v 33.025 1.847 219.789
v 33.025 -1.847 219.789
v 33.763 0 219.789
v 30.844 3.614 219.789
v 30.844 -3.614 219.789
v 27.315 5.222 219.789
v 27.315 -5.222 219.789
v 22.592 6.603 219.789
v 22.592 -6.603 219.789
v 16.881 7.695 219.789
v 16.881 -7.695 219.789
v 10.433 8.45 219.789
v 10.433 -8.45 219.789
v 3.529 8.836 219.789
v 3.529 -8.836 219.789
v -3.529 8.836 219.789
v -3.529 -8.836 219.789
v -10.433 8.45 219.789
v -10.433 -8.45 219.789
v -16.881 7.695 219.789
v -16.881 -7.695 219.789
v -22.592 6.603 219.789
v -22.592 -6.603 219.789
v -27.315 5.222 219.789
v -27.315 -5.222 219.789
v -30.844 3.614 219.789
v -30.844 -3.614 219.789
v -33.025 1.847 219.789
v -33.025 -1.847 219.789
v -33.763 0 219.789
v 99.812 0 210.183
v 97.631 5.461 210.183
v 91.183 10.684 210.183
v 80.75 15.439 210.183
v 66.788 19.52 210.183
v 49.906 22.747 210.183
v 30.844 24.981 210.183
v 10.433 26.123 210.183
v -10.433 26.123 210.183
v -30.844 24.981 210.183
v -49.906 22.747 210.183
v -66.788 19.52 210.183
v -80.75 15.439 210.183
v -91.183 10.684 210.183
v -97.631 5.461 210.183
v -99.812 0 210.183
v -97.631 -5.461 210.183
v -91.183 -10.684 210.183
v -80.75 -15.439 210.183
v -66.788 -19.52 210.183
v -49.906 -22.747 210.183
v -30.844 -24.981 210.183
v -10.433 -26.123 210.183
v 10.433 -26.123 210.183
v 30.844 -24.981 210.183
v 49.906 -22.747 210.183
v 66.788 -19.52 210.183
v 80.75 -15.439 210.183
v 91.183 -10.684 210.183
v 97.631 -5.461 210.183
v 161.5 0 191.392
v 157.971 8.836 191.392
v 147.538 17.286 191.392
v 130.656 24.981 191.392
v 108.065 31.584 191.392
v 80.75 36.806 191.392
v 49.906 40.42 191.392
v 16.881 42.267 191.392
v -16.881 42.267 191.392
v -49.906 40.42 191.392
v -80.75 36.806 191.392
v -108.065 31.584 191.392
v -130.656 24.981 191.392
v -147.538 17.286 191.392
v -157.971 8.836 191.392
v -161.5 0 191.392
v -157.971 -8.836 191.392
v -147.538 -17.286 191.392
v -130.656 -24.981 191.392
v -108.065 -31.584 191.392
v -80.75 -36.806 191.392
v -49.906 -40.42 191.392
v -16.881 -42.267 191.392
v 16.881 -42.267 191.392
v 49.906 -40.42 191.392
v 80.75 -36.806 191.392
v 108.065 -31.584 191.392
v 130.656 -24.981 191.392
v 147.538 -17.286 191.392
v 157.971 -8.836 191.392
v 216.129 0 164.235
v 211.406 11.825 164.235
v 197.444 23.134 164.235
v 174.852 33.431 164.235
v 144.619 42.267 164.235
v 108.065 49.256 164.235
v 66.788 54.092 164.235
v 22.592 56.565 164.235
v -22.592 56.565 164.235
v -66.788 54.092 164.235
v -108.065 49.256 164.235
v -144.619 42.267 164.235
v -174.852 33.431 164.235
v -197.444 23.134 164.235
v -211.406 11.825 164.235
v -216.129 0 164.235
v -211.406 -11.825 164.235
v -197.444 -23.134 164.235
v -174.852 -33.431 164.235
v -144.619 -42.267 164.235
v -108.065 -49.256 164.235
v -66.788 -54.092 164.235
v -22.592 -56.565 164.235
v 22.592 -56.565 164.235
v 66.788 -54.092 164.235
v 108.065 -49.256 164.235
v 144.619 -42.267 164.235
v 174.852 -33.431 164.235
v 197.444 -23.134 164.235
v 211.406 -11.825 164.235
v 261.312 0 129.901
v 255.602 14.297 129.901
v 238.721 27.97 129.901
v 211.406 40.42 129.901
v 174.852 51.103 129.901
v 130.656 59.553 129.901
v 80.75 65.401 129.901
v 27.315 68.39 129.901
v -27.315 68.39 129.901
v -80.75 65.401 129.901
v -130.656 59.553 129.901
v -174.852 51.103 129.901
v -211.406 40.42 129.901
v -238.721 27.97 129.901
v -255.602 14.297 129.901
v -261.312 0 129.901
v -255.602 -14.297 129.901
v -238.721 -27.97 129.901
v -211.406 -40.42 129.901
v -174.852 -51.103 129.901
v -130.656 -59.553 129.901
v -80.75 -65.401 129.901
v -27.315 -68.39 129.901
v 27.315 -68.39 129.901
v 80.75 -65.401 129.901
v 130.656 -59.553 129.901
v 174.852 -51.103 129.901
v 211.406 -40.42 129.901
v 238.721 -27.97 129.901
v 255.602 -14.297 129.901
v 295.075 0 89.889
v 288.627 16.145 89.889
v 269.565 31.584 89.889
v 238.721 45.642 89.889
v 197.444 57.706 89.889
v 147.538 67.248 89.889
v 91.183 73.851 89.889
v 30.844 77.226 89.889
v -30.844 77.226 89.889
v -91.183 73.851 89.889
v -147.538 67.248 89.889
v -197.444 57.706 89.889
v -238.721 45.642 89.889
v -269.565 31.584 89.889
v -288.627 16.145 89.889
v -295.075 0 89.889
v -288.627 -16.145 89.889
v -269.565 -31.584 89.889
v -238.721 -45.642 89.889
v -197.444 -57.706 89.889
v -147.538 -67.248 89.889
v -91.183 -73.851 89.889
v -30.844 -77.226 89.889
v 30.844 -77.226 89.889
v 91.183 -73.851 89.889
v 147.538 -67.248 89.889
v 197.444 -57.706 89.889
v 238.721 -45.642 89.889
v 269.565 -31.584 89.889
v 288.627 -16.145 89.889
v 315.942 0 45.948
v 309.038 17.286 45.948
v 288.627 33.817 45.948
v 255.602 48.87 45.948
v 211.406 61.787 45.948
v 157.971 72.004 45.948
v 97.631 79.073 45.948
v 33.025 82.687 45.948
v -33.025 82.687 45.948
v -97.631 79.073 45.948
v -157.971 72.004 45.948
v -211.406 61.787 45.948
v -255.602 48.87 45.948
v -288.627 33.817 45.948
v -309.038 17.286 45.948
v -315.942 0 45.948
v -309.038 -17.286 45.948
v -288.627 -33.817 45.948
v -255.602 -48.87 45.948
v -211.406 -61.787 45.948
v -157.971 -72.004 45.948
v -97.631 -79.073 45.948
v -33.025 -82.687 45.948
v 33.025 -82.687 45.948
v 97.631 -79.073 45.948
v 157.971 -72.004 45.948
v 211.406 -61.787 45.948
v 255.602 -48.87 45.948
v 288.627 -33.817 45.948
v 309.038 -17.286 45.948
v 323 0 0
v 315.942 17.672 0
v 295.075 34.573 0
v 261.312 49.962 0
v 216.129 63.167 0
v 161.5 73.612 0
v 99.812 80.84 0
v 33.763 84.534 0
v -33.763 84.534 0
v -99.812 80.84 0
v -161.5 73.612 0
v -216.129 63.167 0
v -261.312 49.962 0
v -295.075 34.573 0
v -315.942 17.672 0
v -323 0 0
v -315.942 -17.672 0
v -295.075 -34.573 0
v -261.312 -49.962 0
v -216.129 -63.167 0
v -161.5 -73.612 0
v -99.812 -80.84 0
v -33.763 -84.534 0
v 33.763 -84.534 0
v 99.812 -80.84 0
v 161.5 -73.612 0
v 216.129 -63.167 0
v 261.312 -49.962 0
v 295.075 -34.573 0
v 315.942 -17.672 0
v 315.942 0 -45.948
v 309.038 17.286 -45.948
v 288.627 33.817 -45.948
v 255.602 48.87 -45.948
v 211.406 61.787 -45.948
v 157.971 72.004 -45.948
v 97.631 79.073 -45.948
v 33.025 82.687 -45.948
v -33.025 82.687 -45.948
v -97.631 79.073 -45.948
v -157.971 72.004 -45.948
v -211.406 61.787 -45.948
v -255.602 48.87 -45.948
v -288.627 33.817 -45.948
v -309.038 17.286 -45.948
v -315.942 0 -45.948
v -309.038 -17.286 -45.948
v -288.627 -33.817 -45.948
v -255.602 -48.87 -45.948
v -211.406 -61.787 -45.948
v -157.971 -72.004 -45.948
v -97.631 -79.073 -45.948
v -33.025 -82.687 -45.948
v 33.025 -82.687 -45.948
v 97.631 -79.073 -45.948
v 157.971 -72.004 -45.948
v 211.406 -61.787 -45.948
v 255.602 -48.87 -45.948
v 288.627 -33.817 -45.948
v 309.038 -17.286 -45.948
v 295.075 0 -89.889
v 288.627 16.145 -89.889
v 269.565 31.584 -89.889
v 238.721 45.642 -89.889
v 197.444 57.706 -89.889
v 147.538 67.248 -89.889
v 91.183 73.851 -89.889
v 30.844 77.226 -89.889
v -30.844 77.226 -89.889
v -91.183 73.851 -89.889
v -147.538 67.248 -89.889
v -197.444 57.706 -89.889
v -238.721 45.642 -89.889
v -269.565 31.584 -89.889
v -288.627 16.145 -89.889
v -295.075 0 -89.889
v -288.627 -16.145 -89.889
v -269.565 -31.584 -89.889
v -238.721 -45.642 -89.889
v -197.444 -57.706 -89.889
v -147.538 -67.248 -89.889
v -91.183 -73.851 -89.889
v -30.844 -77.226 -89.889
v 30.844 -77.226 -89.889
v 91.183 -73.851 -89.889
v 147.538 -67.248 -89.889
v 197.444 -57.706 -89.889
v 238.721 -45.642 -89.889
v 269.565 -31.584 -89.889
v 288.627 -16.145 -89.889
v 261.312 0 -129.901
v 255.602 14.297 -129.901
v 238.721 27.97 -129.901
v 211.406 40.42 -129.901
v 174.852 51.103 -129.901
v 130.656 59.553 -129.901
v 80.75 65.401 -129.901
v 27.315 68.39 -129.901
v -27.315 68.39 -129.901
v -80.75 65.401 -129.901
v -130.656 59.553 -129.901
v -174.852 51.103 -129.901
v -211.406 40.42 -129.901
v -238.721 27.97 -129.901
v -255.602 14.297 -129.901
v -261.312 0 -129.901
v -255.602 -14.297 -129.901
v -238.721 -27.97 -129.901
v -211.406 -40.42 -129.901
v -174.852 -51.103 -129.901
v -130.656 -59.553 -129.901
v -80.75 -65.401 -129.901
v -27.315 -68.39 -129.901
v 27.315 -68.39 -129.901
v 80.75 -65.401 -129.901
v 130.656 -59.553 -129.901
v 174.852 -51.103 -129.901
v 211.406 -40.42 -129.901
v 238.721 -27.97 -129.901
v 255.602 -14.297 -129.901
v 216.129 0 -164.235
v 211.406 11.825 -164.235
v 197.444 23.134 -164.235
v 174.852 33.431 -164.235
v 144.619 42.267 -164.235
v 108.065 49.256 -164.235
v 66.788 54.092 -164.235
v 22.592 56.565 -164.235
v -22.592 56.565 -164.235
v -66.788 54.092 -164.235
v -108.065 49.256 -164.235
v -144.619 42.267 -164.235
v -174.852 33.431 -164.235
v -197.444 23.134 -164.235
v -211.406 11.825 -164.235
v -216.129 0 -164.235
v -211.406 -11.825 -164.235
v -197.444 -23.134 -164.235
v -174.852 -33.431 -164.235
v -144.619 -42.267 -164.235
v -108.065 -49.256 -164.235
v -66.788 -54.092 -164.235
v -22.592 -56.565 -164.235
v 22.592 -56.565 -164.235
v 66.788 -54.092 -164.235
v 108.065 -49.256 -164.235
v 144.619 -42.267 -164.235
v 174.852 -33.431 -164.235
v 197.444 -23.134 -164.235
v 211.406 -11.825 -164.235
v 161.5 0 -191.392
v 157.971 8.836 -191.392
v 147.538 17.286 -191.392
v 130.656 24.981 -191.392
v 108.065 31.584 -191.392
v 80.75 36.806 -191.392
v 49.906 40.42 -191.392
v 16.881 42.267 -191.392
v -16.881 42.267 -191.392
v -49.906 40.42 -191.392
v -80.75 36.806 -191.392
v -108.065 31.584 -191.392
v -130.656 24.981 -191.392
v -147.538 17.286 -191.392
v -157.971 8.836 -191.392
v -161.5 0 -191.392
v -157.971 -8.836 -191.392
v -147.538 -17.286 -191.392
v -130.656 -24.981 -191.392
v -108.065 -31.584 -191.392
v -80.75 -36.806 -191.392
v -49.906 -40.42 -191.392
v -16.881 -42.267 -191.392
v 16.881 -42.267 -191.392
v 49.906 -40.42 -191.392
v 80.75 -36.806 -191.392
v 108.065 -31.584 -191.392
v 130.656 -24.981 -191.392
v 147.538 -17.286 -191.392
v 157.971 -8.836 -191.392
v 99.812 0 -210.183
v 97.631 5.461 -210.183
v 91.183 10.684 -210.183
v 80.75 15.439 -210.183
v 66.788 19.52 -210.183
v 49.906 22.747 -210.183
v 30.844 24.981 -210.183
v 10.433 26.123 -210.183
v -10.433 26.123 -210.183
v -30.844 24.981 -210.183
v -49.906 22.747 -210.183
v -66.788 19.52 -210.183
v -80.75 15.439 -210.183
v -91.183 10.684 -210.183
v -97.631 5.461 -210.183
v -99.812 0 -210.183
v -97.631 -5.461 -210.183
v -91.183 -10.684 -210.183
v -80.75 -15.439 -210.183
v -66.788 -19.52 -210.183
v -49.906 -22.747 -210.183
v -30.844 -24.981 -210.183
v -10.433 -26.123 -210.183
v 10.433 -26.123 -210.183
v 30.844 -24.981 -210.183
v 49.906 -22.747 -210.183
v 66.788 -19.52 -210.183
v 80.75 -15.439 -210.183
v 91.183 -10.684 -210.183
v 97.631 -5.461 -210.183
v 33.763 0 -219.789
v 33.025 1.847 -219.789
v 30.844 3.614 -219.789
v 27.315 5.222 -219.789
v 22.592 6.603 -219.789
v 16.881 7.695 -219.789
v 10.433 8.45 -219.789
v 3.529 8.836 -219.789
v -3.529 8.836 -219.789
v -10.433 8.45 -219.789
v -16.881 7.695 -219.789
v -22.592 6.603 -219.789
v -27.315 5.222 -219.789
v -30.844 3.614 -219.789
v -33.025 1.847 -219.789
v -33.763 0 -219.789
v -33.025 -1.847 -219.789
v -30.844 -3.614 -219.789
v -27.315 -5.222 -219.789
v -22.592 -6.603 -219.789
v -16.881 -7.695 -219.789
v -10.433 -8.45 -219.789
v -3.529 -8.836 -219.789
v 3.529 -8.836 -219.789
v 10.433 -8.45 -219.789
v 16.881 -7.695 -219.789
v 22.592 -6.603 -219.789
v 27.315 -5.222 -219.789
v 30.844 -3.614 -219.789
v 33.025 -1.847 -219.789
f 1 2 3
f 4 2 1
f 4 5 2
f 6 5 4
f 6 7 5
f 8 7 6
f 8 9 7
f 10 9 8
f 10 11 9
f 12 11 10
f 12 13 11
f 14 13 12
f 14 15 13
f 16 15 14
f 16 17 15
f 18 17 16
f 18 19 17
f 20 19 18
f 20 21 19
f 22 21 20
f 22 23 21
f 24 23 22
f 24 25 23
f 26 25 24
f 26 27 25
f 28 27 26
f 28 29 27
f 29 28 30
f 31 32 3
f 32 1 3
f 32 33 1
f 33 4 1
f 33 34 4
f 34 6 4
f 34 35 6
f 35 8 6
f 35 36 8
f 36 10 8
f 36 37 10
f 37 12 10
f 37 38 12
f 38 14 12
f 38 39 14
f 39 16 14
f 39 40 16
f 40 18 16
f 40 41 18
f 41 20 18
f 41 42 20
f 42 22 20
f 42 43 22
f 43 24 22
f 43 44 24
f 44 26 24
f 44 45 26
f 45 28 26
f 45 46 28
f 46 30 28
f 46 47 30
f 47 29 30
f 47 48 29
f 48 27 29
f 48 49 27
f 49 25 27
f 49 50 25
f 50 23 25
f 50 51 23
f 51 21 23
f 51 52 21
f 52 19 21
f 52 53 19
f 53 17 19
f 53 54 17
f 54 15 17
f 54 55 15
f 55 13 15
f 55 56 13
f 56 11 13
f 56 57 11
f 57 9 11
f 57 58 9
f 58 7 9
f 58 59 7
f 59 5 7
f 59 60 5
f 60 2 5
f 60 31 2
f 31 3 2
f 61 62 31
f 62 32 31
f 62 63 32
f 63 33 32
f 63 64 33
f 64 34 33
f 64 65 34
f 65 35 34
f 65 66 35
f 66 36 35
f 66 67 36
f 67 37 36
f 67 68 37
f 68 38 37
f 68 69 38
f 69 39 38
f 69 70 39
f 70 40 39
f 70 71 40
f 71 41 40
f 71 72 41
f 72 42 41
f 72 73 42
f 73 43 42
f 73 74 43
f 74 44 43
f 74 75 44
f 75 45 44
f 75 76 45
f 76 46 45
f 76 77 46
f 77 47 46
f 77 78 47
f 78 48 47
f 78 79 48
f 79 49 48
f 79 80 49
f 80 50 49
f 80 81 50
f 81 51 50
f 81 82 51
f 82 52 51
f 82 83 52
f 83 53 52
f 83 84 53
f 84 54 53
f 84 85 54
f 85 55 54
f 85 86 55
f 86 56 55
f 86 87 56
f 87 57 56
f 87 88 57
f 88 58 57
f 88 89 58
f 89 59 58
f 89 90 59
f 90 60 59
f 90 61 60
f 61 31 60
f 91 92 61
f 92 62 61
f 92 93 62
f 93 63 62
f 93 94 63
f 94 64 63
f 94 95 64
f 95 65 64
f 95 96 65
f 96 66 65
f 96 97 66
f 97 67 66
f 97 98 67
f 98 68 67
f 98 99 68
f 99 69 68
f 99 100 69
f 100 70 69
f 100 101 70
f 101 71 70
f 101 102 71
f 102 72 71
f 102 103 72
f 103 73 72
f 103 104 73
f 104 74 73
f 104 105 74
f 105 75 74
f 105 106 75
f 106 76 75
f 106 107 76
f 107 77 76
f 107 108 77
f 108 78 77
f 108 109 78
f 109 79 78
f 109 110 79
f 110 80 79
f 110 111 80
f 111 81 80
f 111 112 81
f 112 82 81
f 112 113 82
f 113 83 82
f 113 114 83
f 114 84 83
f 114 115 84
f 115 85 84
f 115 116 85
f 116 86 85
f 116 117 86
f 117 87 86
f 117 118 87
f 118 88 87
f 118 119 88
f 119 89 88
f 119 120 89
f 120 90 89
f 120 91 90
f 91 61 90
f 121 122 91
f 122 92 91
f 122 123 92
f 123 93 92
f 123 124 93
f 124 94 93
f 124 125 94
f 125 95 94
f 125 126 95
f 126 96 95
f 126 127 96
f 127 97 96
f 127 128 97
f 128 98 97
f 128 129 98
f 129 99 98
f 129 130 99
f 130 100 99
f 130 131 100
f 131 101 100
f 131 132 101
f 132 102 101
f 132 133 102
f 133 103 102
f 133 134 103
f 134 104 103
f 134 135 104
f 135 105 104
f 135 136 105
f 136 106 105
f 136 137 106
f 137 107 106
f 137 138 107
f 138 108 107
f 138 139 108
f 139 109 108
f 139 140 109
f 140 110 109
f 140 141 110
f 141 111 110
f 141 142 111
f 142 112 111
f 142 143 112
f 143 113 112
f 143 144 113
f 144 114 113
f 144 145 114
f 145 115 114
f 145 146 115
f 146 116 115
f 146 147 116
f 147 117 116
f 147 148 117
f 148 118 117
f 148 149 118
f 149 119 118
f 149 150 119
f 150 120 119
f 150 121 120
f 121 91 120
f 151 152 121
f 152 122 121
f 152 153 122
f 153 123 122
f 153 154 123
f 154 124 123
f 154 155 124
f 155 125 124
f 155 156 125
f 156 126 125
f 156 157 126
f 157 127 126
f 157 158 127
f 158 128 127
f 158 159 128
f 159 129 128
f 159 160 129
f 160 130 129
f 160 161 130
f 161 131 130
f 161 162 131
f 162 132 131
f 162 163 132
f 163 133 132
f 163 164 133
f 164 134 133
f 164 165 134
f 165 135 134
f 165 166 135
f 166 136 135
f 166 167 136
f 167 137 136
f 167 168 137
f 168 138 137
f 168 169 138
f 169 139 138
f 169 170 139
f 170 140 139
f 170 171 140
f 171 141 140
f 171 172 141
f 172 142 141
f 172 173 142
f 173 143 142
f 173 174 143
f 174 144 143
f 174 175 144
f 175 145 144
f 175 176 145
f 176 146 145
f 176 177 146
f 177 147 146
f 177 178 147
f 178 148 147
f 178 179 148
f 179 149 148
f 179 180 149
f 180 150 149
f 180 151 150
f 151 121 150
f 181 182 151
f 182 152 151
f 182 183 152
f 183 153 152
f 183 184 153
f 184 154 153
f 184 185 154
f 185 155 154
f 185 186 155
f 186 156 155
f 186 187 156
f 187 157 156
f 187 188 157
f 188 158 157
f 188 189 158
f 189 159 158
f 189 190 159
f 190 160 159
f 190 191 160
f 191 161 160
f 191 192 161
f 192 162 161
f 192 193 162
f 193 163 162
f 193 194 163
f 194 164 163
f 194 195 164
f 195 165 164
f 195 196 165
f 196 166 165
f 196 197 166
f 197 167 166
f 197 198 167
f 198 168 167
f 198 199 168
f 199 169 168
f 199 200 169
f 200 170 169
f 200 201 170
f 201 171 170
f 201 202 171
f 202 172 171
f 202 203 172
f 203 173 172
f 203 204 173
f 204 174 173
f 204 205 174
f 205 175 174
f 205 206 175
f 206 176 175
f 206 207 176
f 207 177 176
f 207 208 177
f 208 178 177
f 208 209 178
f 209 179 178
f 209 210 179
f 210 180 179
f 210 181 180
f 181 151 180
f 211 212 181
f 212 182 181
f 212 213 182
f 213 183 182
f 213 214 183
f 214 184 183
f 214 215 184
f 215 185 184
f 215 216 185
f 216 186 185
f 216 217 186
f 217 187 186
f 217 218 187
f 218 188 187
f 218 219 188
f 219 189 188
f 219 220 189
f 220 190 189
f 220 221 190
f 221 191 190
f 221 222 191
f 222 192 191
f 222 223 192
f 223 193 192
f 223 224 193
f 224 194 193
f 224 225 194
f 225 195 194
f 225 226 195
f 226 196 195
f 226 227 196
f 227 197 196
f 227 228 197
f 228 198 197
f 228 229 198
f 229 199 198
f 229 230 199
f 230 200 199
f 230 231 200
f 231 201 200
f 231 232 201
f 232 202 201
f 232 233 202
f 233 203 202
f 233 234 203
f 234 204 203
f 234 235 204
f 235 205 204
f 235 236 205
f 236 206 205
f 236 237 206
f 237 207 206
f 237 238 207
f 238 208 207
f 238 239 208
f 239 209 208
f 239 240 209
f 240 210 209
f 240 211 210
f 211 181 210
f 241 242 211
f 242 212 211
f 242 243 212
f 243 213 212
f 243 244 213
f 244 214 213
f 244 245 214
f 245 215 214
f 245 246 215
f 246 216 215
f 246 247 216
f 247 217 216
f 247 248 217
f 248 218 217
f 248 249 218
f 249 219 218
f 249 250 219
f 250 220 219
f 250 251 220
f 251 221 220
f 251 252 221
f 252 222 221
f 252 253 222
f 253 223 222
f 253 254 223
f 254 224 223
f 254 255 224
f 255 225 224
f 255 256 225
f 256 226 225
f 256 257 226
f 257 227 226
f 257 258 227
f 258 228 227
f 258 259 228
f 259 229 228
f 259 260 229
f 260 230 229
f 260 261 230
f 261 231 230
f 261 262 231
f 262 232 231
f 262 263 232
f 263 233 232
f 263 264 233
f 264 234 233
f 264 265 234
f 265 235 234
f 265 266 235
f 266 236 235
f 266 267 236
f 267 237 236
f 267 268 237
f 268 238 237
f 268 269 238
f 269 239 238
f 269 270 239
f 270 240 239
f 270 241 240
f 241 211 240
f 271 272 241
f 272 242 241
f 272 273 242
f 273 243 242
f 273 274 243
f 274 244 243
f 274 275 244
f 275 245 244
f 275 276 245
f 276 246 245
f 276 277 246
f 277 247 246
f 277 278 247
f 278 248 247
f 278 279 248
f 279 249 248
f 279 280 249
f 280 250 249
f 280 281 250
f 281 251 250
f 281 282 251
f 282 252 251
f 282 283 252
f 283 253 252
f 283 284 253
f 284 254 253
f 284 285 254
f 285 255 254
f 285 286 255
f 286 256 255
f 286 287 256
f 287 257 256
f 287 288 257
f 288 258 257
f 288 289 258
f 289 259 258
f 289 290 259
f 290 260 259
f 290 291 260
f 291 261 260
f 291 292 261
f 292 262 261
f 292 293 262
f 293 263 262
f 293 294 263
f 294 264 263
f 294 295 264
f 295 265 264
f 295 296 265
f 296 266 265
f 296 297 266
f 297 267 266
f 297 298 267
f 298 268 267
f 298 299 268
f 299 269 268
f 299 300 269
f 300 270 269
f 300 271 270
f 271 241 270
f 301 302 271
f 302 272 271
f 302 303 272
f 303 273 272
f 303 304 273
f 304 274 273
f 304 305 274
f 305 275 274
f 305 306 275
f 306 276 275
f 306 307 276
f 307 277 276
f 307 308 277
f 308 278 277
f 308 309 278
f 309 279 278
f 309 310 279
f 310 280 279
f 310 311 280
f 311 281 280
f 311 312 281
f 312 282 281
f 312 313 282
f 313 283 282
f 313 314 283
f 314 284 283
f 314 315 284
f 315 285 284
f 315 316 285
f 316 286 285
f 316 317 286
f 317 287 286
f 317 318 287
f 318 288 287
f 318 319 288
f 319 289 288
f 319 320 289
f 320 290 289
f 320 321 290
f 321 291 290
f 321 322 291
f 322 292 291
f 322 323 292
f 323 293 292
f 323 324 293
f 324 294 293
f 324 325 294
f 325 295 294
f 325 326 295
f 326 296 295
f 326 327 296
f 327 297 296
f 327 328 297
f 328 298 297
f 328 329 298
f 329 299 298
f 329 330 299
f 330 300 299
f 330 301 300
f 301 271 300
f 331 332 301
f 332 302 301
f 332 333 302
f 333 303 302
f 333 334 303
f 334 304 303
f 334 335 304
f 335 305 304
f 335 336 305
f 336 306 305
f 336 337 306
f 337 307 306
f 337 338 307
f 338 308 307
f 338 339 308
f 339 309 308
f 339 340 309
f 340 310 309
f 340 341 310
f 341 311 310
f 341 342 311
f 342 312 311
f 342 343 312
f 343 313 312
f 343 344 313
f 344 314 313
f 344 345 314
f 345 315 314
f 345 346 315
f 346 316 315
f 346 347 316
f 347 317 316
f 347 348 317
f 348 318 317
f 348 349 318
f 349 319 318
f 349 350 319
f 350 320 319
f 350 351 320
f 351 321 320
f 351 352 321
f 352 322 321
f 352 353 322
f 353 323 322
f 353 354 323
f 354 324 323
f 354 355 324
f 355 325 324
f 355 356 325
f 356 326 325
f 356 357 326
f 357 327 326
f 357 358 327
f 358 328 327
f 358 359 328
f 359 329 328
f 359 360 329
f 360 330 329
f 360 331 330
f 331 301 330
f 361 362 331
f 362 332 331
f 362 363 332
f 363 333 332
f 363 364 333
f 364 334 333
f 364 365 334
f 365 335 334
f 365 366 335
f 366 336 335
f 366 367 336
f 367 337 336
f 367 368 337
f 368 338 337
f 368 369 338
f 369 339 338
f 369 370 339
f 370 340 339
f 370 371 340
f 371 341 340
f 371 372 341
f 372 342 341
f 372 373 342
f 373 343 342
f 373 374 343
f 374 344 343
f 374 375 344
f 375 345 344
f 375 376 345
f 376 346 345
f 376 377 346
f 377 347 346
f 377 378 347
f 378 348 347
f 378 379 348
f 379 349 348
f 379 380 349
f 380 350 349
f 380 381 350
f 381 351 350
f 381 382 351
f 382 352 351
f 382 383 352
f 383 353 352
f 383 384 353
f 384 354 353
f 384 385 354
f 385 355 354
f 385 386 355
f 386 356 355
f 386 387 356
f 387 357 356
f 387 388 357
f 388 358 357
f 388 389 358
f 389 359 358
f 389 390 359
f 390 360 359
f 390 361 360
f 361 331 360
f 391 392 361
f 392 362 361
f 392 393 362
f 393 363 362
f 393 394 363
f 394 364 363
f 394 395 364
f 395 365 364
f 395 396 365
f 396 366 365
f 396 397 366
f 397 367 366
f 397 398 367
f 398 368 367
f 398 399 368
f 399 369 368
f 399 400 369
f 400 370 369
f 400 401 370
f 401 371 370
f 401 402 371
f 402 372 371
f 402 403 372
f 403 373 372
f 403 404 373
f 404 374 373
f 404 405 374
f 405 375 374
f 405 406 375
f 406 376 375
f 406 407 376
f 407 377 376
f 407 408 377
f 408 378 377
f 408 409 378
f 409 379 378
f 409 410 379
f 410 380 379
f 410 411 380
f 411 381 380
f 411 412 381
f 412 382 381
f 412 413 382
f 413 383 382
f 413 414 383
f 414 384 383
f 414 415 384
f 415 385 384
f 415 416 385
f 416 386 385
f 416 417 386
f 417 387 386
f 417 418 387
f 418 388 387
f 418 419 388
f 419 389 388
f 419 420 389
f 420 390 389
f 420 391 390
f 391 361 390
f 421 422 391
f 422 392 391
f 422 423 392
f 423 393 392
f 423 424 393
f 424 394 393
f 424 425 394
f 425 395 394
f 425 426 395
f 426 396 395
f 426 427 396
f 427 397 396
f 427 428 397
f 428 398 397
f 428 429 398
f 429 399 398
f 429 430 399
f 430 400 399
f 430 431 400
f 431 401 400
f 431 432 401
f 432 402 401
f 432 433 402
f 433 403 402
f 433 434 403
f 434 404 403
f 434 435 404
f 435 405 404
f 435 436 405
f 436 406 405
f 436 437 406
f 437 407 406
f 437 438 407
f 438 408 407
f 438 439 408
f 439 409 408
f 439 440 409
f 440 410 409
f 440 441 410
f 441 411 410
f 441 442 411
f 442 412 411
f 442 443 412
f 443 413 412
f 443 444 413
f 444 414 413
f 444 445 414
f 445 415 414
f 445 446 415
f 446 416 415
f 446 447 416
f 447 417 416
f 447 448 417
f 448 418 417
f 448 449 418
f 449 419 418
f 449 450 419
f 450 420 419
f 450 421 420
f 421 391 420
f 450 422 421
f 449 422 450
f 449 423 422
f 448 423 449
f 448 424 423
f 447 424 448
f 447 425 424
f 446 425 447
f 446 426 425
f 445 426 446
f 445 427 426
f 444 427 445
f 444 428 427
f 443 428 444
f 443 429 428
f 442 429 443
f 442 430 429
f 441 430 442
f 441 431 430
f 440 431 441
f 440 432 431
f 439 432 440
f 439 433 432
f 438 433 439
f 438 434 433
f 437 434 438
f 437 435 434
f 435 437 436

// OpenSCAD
// Generated by SolidPython 1.0.1 on 2020-07-29 00:46:53


scale(v = [19, 5, 13]) {
	sphere(r = 17);
}
/***********************************************
*********      SolidPython code:      **********
************************************************
 
# import packages: SolidPython
from solid import *
from solid.utils import *
from itertools import chain, combinations, permutations


class Resize:

    def __init__(self, scad_file):
        self.scad_file = scad_file
        #self.scad_file = import_scad(scad_file)
        # cone/cylinder param:
        self.r1 = 0
        self.r2 = 0
        self.h = 0
        # rectangular prism param:
        self.w = 0
        self.l = 0
        # ellipse param:
        self.r = 0

    # import OpenScad code (file name corresponds to shape)


    # classify shape + parameters
    def assign(self, param1, param2, param3):
        if self.scad_file == 'cone.scad':
            self.r1 = param1
            self.r2 = param2
            self.h = param3
        elif self.scad_file == 'cylinder.scad':
            self.r1 = param1
            self.r2 = param2
            self.h = param3
        elif self.scad_file == 'rectangularPrism.scad':
            self.h = param1
            self.l = param2
            self.w = param3
        else:
            self.r = param1
            self.h = param2

    # resize parameters
    def iterate(self):
        x = range(3, 20, 2)
        i = 1
        if self.scad_file == 'cone.scad':
            tempList = list(permutations(x, 2))
            for temp in tempList:
                param1 = temp[0]
                param2 = temp[1]
                filepath = 'produced_scad_files/' + 'cone' + str(param1) + '_' + str(param2) + '_' + '.scad'
                scad_render_to_file(cylinder(h=param1, r1=param2, r2=0), filepath)

        elif self.scad_file == 'cylinder.scad':
            tempList = list(permutations(x, 3))
            for temp in tempList:
                param1 = temp[0]
                param2 = temp[1]
                filepath = 'produced_scad_files/' + 'cylinder' + str(param1) + '_' + str(param2) + '_' + '.scad'
                scad_render_to_file(cylinder(h=param1, r1=param2, r2=param2), filepath)

        elif self.scad_file == 'rectangularPrism.scad':
            tempList = list(permutations(x, 3))
            for temp in tempList:
                param1 = temp[0]
                param2 = temp[1]
                param3 = temp[2]
                filepath = 'produced_scad_files/' + 'rectangularPrism' + str(param1) + '_' + str(param2) + '_' + str(
                    param3) + '.scad'
                scad_render_to_file(cube(size=(param1, param2, param3)), filepath)

        elif self.scad_file == 'ellipse.scad':
            tempList = list(permutations(x, 4))
            for temp in tempList:
                param1 = temp[0]
                param2 = temp[1]
                param3 = temp[2]
                param4 = temp[3]
                filepath = 'produced_scad_files/' + 'ellipse' + str(param1) + '_' + str(param2) + '_' + str(param3) + '_' + str(param4) + '.scad'
                scad_render_to_file(scale([param1, param2, param3])(sphere(r=param4)), filepath)

    def render_to_scadfile(self):
        scad_render_to_file(scad, 'example.scad') 
 
************************************************/
